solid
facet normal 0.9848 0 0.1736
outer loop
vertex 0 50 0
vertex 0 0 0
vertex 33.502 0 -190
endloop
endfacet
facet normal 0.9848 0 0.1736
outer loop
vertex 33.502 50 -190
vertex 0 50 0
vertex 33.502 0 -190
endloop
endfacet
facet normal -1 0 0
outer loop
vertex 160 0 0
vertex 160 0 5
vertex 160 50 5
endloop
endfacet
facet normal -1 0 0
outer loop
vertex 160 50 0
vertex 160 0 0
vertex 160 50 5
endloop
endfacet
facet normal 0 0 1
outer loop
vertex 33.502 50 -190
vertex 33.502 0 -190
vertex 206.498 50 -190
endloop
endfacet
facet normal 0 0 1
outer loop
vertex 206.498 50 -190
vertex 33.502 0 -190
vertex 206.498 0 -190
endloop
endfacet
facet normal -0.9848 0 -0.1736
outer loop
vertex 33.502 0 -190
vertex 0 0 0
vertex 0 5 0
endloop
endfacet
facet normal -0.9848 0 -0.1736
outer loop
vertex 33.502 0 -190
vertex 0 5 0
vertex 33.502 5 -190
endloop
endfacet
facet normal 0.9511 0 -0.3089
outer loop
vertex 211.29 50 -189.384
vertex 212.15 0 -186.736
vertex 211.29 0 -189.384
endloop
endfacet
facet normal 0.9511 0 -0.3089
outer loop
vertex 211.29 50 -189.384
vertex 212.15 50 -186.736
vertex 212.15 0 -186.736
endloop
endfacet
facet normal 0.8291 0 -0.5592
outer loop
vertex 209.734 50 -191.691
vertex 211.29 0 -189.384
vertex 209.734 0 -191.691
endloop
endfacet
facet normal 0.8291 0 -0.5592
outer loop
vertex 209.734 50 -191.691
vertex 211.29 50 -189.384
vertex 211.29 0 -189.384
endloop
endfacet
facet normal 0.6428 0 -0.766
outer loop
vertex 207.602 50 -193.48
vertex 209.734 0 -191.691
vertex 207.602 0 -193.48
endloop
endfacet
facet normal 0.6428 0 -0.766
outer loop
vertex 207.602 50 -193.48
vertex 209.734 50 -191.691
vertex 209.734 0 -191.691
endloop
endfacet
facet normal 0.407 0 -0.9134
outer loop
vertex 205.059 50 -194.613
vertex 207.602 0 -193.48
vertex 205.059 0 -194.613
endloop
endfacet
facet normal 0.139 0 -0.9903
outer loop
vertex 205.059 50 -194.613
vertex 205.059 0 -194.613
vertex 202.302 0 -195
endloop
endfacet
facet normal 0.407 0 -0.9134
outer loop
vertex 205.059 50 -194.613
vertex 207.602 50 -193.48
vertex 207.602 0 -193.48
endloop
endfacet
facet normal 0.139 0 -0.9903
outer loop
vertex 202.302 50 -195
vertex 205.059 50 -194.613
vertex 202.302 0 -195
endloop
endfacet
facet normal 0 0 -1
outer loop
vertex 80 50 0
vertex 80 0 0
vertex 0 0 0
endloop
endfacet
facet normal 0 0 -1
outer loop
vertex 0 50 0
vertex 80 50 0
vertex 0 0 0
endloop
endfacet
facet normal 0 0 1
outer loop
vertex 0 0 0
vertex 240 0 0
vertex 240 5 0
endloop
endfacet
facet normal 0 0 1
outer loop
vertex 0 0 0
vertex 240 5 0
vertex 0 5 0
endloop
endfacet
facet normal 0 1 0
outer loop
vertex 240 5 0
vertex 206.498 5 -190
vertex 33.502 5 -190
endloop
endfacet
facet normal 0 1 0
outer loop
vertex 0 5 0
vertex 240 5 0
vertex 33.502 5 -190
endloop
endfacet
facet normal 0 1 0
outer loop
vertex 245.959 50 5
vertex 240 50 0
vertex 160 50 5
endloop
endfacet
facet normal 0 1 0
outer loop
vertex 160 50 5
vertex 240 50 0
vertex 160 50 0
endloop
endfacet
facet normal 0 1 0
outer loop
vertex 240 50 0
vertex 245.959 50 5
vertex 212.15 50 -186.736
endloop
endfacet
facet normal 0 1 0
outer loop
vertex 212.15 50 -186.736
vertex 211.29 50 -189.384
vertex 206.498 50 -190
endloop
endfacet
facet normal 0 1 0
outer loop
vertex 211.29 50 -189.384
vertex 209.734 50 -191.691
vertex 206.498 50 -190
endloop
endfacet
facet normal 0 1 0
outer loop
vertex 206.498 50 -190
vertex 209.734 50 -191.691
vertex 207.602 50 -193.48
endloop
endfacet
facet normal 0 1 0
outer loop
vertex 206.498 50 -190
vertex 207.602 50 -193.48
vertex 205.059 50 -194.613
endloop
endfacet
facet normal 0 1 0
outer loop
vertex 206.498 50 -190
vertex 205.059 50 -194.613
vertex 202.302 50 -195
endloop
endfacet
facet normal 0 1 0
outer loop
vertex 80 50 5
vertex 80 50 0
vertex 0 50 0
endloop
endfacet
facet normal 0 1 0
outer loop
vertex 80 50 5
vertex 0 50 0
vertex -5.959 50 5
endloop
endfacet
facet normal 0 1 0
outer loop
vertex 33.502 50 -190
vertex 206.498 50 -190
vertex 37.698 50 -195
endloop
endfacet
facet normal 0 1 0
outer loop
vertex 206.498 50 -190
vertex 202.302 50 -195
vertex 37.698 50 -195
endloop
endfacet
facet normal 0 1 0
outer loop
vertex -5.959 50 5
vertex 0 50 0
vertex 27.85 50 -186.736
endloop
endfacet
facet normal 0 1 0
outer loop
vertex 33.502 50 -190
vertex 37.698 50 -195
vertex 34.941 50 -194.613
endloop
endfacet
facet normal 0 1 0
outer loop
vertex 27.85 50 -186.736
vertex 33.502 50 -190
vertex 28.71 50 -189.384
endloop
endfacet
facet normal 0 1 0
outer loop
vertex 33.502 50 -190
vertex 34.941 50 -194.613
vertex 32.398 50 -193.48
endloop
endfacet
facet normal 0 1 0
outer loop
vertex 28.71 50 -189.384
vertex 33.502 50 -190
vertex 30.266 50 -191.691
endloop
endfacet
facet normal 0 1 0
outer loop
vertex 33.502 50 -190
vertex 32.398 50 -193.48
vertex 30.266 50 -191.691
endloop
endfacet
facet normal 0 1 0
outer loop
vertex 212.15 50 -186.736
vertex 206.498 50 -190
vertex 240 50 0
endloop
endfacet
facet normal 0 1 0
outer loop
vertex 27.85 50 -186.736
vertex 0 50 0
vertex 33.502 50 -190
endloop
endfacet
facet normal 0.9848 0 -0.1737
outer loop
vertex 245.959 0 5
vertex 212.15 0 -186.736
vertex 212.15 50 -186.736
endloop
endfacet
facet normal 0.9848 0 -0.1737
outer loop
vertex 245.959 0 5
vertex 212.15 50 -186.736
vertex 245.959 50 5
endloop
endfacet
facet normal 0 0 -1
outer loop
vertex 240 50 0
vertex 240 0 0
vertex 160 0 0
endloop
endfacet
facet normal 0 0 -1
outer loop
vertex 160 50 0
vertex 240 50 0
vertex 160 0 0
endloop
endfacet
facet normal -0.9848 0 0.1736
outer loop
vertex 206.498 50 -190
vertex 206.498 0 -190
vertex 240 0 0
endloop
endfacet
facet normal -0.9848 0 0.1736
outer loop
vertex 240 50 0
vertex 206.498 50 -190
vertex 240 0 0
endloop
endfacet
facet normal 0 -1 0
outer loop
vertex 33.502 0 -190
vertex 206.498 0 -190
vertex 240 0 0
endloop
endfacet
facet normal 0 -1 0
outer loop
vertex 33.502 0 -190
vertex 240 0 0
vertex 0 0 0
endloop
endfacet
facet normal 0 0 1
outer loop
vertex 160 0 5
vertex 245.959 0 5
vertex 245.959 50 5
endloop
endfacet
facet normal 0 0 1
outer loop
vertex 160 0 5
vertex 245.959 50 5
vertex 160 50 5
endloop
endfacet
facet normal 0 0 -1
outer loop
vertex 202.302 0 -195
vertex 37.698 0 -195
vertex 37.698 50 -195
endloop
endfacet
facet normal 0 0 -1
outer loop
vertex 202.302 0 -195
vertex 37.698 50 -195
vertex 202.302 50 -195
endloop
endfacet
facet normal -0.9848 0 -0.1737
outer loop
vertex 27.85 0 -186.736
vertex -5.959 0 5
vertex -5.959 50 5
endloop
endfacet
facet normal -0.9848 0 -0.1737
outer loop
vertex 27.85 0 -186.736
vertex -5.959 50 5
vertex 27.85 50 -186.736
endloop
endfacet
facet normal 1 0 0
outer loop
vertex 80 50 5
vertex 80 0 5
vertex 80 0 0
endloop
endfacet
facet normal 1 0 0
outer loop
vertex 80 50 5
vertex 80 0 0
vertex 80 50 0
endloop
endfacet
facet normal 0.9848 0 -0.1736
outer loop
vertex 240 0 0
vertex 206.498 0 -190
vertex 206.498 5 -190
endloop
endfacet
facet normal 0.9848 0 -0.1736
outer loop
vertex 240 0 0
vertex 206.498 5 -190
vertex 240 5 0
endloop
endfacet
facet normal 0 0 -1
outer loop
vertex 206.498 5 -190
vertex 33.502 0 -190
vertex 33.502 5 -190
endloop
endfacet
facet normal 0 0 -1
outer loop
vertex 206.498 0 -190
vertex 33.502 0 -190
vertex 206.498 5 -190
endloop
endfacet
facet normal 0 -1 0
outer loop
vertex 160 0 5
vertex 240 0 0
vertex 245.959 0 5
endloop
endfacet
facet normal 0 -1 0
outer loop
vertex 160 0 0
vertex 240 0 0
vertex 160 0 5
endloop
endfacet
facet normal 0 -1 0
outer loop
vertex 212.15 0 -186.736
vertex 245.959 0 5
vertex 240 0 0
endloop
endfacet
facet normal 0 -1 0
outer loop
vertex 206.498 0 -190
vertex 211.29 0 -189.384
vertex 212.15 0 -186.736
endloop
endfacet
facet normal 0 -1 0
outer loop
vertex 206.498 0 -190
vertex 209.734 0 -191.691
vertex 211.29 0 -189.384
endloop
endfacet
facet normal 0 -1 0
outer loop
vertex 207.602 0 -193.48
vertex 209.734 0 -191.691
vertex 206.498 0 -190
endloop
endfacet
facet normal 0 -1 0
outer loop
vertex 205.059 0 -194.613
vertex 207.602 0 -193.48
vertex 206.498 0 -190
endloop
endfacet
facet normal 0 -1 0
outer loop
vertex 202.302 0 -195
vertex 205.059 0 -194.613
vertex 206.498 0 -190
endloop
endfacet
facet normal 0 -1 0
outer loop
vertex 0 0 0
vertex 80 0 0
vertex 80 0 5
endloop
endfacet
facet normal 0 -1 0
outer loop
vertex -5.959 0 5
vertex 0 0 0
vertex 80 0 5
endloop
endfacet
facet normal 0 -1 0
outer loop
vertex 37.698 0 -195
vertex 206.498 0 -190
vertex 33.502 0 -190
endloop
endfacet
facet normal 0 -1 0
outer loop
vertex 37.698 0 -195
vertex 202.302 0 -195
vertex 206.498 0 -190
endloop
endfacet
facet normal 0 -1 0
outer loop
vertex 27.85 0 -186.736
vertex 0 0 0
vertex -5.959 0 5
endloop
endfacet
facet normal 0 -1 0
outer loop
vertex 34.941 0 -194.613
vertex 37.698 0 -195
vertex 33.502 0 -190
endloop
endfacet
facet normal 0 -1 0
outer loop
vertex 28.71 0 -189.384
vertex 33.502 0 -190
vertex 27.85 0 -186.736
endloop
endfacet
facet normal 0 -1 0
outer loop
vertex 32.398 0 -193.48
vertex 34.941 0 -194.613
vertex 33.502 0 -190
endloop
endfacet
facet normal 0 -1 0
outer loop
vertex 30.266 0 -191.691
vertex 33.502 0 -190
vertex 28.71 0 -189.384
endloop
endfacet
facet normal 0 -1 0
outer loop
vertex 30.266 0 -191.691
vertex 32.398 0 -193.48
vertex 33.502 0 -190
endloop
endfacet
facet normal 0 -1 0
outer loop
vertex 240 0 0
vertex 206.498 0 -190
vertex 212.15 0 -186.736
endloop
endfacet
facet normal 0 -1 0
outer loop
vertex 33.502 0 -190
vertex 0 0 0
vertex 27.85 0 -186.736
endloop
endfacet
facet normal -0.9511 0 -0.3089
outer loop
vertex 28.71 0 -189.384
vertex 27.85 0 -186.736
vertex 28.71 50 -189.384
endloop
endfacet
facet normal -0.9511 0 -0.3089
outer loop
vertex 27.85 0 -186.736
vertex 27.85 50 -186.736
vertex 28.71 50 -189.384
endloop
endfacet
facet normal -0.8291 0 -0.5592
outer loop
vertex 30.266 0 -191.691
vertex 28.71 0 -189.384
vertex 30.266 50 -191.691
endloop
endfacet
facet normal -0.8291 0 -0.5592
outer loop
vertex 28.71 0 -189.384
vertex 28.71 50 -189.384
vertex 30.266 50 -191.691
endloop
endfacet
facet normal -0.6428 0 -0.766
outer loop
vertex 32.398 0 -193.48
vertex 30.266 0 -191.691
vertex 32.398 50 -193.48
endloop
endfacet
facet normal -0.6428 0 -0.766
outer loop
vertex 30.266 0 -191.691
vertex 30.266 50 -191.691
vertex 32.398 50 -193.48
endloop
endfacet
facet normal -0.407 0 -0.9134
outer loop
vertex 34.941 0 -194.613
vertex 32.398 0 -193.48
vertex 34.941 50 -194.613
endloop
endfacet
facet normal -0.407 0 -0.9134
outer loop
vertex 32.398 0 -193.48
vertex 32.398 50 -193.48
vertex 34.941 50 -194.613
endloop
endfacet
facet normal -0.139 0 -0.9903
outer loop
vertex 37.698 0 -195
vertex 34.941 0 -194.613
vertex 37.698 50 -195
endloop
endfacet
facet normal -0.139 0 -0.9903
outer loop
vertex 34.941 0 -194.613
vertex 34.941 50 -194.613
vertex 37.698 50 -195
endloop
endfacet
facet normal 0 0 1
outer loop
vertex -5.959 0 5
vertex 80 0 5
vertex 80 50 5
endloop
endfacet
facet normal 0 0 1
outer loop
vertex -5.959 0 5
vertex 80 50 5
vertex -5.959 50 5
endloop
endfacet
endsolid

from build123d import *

# Parameters (mm, degrees)
EXTRUDE_THIN1_DEPTH = 50
BOSS_EXTRUDE1_DEPTH = 5
FILLET1_R           = 10
SKETCH2_W           = 80
SKETCH2_H           = 50
CUT_EXTRUDE1_DEPTH  = 5


with BuildPart() as part:
    # Sketch1 → Extrude-Thin1 (new body)
    with BuildSketch(Plane(origin=(0, 0, 0), x_dir=(1, 0, 0), z_dir=(0, 1, 0))):
        Polygon((245.958767963, -5), (-5.958767963, -5), (29.306628179, 195), (210.693371821, 195), align=None)
        Polygon((240, 0), (0, 0), (33.502126335, 190), (206.497873665, 190), align=None, mode=Mode.SUBTRACT)
    extrude(amount=EXTRUDE_THIN1_DEPTH)

    # Fillet1
    fillet1_edges = [part.edges().sort_by_distance(p)[0] for p in [
        (210.693371821, 25, -195),
        (29.306628179, 25, -195),
    ]]
    fillet(fillet1_edges, radius=FILLET1_R)

    # Sketch2 → Cut-Extrude1 (cut)
    with BuildSketch(Plane.XY.offset(5)):
        with Locations((120, 25)):
            Rectangle(SKETCH2_W, SKETCH2_H)
    extrude(amount=-CUT_EXTRUDE1_DEPTH, mode=Mode.SUBTRACT)


with BuildPart() as body_2:
    # Sketch1<3> → Boss-Extrude1 (new body)
    with BuildSketch(Plane(origin=(0, 0, 0), x_dir=(1, 0, 0), z_dir=(0, 1, 0))):
        Polygon((0, 0), (33.502126335, 190), (206.497873665, 190), (240, 0), align=None)
    extrude(amount=BOSS_EXTRUDE1_DEPTH)


solid = Compound([part.part, body_2.part])
